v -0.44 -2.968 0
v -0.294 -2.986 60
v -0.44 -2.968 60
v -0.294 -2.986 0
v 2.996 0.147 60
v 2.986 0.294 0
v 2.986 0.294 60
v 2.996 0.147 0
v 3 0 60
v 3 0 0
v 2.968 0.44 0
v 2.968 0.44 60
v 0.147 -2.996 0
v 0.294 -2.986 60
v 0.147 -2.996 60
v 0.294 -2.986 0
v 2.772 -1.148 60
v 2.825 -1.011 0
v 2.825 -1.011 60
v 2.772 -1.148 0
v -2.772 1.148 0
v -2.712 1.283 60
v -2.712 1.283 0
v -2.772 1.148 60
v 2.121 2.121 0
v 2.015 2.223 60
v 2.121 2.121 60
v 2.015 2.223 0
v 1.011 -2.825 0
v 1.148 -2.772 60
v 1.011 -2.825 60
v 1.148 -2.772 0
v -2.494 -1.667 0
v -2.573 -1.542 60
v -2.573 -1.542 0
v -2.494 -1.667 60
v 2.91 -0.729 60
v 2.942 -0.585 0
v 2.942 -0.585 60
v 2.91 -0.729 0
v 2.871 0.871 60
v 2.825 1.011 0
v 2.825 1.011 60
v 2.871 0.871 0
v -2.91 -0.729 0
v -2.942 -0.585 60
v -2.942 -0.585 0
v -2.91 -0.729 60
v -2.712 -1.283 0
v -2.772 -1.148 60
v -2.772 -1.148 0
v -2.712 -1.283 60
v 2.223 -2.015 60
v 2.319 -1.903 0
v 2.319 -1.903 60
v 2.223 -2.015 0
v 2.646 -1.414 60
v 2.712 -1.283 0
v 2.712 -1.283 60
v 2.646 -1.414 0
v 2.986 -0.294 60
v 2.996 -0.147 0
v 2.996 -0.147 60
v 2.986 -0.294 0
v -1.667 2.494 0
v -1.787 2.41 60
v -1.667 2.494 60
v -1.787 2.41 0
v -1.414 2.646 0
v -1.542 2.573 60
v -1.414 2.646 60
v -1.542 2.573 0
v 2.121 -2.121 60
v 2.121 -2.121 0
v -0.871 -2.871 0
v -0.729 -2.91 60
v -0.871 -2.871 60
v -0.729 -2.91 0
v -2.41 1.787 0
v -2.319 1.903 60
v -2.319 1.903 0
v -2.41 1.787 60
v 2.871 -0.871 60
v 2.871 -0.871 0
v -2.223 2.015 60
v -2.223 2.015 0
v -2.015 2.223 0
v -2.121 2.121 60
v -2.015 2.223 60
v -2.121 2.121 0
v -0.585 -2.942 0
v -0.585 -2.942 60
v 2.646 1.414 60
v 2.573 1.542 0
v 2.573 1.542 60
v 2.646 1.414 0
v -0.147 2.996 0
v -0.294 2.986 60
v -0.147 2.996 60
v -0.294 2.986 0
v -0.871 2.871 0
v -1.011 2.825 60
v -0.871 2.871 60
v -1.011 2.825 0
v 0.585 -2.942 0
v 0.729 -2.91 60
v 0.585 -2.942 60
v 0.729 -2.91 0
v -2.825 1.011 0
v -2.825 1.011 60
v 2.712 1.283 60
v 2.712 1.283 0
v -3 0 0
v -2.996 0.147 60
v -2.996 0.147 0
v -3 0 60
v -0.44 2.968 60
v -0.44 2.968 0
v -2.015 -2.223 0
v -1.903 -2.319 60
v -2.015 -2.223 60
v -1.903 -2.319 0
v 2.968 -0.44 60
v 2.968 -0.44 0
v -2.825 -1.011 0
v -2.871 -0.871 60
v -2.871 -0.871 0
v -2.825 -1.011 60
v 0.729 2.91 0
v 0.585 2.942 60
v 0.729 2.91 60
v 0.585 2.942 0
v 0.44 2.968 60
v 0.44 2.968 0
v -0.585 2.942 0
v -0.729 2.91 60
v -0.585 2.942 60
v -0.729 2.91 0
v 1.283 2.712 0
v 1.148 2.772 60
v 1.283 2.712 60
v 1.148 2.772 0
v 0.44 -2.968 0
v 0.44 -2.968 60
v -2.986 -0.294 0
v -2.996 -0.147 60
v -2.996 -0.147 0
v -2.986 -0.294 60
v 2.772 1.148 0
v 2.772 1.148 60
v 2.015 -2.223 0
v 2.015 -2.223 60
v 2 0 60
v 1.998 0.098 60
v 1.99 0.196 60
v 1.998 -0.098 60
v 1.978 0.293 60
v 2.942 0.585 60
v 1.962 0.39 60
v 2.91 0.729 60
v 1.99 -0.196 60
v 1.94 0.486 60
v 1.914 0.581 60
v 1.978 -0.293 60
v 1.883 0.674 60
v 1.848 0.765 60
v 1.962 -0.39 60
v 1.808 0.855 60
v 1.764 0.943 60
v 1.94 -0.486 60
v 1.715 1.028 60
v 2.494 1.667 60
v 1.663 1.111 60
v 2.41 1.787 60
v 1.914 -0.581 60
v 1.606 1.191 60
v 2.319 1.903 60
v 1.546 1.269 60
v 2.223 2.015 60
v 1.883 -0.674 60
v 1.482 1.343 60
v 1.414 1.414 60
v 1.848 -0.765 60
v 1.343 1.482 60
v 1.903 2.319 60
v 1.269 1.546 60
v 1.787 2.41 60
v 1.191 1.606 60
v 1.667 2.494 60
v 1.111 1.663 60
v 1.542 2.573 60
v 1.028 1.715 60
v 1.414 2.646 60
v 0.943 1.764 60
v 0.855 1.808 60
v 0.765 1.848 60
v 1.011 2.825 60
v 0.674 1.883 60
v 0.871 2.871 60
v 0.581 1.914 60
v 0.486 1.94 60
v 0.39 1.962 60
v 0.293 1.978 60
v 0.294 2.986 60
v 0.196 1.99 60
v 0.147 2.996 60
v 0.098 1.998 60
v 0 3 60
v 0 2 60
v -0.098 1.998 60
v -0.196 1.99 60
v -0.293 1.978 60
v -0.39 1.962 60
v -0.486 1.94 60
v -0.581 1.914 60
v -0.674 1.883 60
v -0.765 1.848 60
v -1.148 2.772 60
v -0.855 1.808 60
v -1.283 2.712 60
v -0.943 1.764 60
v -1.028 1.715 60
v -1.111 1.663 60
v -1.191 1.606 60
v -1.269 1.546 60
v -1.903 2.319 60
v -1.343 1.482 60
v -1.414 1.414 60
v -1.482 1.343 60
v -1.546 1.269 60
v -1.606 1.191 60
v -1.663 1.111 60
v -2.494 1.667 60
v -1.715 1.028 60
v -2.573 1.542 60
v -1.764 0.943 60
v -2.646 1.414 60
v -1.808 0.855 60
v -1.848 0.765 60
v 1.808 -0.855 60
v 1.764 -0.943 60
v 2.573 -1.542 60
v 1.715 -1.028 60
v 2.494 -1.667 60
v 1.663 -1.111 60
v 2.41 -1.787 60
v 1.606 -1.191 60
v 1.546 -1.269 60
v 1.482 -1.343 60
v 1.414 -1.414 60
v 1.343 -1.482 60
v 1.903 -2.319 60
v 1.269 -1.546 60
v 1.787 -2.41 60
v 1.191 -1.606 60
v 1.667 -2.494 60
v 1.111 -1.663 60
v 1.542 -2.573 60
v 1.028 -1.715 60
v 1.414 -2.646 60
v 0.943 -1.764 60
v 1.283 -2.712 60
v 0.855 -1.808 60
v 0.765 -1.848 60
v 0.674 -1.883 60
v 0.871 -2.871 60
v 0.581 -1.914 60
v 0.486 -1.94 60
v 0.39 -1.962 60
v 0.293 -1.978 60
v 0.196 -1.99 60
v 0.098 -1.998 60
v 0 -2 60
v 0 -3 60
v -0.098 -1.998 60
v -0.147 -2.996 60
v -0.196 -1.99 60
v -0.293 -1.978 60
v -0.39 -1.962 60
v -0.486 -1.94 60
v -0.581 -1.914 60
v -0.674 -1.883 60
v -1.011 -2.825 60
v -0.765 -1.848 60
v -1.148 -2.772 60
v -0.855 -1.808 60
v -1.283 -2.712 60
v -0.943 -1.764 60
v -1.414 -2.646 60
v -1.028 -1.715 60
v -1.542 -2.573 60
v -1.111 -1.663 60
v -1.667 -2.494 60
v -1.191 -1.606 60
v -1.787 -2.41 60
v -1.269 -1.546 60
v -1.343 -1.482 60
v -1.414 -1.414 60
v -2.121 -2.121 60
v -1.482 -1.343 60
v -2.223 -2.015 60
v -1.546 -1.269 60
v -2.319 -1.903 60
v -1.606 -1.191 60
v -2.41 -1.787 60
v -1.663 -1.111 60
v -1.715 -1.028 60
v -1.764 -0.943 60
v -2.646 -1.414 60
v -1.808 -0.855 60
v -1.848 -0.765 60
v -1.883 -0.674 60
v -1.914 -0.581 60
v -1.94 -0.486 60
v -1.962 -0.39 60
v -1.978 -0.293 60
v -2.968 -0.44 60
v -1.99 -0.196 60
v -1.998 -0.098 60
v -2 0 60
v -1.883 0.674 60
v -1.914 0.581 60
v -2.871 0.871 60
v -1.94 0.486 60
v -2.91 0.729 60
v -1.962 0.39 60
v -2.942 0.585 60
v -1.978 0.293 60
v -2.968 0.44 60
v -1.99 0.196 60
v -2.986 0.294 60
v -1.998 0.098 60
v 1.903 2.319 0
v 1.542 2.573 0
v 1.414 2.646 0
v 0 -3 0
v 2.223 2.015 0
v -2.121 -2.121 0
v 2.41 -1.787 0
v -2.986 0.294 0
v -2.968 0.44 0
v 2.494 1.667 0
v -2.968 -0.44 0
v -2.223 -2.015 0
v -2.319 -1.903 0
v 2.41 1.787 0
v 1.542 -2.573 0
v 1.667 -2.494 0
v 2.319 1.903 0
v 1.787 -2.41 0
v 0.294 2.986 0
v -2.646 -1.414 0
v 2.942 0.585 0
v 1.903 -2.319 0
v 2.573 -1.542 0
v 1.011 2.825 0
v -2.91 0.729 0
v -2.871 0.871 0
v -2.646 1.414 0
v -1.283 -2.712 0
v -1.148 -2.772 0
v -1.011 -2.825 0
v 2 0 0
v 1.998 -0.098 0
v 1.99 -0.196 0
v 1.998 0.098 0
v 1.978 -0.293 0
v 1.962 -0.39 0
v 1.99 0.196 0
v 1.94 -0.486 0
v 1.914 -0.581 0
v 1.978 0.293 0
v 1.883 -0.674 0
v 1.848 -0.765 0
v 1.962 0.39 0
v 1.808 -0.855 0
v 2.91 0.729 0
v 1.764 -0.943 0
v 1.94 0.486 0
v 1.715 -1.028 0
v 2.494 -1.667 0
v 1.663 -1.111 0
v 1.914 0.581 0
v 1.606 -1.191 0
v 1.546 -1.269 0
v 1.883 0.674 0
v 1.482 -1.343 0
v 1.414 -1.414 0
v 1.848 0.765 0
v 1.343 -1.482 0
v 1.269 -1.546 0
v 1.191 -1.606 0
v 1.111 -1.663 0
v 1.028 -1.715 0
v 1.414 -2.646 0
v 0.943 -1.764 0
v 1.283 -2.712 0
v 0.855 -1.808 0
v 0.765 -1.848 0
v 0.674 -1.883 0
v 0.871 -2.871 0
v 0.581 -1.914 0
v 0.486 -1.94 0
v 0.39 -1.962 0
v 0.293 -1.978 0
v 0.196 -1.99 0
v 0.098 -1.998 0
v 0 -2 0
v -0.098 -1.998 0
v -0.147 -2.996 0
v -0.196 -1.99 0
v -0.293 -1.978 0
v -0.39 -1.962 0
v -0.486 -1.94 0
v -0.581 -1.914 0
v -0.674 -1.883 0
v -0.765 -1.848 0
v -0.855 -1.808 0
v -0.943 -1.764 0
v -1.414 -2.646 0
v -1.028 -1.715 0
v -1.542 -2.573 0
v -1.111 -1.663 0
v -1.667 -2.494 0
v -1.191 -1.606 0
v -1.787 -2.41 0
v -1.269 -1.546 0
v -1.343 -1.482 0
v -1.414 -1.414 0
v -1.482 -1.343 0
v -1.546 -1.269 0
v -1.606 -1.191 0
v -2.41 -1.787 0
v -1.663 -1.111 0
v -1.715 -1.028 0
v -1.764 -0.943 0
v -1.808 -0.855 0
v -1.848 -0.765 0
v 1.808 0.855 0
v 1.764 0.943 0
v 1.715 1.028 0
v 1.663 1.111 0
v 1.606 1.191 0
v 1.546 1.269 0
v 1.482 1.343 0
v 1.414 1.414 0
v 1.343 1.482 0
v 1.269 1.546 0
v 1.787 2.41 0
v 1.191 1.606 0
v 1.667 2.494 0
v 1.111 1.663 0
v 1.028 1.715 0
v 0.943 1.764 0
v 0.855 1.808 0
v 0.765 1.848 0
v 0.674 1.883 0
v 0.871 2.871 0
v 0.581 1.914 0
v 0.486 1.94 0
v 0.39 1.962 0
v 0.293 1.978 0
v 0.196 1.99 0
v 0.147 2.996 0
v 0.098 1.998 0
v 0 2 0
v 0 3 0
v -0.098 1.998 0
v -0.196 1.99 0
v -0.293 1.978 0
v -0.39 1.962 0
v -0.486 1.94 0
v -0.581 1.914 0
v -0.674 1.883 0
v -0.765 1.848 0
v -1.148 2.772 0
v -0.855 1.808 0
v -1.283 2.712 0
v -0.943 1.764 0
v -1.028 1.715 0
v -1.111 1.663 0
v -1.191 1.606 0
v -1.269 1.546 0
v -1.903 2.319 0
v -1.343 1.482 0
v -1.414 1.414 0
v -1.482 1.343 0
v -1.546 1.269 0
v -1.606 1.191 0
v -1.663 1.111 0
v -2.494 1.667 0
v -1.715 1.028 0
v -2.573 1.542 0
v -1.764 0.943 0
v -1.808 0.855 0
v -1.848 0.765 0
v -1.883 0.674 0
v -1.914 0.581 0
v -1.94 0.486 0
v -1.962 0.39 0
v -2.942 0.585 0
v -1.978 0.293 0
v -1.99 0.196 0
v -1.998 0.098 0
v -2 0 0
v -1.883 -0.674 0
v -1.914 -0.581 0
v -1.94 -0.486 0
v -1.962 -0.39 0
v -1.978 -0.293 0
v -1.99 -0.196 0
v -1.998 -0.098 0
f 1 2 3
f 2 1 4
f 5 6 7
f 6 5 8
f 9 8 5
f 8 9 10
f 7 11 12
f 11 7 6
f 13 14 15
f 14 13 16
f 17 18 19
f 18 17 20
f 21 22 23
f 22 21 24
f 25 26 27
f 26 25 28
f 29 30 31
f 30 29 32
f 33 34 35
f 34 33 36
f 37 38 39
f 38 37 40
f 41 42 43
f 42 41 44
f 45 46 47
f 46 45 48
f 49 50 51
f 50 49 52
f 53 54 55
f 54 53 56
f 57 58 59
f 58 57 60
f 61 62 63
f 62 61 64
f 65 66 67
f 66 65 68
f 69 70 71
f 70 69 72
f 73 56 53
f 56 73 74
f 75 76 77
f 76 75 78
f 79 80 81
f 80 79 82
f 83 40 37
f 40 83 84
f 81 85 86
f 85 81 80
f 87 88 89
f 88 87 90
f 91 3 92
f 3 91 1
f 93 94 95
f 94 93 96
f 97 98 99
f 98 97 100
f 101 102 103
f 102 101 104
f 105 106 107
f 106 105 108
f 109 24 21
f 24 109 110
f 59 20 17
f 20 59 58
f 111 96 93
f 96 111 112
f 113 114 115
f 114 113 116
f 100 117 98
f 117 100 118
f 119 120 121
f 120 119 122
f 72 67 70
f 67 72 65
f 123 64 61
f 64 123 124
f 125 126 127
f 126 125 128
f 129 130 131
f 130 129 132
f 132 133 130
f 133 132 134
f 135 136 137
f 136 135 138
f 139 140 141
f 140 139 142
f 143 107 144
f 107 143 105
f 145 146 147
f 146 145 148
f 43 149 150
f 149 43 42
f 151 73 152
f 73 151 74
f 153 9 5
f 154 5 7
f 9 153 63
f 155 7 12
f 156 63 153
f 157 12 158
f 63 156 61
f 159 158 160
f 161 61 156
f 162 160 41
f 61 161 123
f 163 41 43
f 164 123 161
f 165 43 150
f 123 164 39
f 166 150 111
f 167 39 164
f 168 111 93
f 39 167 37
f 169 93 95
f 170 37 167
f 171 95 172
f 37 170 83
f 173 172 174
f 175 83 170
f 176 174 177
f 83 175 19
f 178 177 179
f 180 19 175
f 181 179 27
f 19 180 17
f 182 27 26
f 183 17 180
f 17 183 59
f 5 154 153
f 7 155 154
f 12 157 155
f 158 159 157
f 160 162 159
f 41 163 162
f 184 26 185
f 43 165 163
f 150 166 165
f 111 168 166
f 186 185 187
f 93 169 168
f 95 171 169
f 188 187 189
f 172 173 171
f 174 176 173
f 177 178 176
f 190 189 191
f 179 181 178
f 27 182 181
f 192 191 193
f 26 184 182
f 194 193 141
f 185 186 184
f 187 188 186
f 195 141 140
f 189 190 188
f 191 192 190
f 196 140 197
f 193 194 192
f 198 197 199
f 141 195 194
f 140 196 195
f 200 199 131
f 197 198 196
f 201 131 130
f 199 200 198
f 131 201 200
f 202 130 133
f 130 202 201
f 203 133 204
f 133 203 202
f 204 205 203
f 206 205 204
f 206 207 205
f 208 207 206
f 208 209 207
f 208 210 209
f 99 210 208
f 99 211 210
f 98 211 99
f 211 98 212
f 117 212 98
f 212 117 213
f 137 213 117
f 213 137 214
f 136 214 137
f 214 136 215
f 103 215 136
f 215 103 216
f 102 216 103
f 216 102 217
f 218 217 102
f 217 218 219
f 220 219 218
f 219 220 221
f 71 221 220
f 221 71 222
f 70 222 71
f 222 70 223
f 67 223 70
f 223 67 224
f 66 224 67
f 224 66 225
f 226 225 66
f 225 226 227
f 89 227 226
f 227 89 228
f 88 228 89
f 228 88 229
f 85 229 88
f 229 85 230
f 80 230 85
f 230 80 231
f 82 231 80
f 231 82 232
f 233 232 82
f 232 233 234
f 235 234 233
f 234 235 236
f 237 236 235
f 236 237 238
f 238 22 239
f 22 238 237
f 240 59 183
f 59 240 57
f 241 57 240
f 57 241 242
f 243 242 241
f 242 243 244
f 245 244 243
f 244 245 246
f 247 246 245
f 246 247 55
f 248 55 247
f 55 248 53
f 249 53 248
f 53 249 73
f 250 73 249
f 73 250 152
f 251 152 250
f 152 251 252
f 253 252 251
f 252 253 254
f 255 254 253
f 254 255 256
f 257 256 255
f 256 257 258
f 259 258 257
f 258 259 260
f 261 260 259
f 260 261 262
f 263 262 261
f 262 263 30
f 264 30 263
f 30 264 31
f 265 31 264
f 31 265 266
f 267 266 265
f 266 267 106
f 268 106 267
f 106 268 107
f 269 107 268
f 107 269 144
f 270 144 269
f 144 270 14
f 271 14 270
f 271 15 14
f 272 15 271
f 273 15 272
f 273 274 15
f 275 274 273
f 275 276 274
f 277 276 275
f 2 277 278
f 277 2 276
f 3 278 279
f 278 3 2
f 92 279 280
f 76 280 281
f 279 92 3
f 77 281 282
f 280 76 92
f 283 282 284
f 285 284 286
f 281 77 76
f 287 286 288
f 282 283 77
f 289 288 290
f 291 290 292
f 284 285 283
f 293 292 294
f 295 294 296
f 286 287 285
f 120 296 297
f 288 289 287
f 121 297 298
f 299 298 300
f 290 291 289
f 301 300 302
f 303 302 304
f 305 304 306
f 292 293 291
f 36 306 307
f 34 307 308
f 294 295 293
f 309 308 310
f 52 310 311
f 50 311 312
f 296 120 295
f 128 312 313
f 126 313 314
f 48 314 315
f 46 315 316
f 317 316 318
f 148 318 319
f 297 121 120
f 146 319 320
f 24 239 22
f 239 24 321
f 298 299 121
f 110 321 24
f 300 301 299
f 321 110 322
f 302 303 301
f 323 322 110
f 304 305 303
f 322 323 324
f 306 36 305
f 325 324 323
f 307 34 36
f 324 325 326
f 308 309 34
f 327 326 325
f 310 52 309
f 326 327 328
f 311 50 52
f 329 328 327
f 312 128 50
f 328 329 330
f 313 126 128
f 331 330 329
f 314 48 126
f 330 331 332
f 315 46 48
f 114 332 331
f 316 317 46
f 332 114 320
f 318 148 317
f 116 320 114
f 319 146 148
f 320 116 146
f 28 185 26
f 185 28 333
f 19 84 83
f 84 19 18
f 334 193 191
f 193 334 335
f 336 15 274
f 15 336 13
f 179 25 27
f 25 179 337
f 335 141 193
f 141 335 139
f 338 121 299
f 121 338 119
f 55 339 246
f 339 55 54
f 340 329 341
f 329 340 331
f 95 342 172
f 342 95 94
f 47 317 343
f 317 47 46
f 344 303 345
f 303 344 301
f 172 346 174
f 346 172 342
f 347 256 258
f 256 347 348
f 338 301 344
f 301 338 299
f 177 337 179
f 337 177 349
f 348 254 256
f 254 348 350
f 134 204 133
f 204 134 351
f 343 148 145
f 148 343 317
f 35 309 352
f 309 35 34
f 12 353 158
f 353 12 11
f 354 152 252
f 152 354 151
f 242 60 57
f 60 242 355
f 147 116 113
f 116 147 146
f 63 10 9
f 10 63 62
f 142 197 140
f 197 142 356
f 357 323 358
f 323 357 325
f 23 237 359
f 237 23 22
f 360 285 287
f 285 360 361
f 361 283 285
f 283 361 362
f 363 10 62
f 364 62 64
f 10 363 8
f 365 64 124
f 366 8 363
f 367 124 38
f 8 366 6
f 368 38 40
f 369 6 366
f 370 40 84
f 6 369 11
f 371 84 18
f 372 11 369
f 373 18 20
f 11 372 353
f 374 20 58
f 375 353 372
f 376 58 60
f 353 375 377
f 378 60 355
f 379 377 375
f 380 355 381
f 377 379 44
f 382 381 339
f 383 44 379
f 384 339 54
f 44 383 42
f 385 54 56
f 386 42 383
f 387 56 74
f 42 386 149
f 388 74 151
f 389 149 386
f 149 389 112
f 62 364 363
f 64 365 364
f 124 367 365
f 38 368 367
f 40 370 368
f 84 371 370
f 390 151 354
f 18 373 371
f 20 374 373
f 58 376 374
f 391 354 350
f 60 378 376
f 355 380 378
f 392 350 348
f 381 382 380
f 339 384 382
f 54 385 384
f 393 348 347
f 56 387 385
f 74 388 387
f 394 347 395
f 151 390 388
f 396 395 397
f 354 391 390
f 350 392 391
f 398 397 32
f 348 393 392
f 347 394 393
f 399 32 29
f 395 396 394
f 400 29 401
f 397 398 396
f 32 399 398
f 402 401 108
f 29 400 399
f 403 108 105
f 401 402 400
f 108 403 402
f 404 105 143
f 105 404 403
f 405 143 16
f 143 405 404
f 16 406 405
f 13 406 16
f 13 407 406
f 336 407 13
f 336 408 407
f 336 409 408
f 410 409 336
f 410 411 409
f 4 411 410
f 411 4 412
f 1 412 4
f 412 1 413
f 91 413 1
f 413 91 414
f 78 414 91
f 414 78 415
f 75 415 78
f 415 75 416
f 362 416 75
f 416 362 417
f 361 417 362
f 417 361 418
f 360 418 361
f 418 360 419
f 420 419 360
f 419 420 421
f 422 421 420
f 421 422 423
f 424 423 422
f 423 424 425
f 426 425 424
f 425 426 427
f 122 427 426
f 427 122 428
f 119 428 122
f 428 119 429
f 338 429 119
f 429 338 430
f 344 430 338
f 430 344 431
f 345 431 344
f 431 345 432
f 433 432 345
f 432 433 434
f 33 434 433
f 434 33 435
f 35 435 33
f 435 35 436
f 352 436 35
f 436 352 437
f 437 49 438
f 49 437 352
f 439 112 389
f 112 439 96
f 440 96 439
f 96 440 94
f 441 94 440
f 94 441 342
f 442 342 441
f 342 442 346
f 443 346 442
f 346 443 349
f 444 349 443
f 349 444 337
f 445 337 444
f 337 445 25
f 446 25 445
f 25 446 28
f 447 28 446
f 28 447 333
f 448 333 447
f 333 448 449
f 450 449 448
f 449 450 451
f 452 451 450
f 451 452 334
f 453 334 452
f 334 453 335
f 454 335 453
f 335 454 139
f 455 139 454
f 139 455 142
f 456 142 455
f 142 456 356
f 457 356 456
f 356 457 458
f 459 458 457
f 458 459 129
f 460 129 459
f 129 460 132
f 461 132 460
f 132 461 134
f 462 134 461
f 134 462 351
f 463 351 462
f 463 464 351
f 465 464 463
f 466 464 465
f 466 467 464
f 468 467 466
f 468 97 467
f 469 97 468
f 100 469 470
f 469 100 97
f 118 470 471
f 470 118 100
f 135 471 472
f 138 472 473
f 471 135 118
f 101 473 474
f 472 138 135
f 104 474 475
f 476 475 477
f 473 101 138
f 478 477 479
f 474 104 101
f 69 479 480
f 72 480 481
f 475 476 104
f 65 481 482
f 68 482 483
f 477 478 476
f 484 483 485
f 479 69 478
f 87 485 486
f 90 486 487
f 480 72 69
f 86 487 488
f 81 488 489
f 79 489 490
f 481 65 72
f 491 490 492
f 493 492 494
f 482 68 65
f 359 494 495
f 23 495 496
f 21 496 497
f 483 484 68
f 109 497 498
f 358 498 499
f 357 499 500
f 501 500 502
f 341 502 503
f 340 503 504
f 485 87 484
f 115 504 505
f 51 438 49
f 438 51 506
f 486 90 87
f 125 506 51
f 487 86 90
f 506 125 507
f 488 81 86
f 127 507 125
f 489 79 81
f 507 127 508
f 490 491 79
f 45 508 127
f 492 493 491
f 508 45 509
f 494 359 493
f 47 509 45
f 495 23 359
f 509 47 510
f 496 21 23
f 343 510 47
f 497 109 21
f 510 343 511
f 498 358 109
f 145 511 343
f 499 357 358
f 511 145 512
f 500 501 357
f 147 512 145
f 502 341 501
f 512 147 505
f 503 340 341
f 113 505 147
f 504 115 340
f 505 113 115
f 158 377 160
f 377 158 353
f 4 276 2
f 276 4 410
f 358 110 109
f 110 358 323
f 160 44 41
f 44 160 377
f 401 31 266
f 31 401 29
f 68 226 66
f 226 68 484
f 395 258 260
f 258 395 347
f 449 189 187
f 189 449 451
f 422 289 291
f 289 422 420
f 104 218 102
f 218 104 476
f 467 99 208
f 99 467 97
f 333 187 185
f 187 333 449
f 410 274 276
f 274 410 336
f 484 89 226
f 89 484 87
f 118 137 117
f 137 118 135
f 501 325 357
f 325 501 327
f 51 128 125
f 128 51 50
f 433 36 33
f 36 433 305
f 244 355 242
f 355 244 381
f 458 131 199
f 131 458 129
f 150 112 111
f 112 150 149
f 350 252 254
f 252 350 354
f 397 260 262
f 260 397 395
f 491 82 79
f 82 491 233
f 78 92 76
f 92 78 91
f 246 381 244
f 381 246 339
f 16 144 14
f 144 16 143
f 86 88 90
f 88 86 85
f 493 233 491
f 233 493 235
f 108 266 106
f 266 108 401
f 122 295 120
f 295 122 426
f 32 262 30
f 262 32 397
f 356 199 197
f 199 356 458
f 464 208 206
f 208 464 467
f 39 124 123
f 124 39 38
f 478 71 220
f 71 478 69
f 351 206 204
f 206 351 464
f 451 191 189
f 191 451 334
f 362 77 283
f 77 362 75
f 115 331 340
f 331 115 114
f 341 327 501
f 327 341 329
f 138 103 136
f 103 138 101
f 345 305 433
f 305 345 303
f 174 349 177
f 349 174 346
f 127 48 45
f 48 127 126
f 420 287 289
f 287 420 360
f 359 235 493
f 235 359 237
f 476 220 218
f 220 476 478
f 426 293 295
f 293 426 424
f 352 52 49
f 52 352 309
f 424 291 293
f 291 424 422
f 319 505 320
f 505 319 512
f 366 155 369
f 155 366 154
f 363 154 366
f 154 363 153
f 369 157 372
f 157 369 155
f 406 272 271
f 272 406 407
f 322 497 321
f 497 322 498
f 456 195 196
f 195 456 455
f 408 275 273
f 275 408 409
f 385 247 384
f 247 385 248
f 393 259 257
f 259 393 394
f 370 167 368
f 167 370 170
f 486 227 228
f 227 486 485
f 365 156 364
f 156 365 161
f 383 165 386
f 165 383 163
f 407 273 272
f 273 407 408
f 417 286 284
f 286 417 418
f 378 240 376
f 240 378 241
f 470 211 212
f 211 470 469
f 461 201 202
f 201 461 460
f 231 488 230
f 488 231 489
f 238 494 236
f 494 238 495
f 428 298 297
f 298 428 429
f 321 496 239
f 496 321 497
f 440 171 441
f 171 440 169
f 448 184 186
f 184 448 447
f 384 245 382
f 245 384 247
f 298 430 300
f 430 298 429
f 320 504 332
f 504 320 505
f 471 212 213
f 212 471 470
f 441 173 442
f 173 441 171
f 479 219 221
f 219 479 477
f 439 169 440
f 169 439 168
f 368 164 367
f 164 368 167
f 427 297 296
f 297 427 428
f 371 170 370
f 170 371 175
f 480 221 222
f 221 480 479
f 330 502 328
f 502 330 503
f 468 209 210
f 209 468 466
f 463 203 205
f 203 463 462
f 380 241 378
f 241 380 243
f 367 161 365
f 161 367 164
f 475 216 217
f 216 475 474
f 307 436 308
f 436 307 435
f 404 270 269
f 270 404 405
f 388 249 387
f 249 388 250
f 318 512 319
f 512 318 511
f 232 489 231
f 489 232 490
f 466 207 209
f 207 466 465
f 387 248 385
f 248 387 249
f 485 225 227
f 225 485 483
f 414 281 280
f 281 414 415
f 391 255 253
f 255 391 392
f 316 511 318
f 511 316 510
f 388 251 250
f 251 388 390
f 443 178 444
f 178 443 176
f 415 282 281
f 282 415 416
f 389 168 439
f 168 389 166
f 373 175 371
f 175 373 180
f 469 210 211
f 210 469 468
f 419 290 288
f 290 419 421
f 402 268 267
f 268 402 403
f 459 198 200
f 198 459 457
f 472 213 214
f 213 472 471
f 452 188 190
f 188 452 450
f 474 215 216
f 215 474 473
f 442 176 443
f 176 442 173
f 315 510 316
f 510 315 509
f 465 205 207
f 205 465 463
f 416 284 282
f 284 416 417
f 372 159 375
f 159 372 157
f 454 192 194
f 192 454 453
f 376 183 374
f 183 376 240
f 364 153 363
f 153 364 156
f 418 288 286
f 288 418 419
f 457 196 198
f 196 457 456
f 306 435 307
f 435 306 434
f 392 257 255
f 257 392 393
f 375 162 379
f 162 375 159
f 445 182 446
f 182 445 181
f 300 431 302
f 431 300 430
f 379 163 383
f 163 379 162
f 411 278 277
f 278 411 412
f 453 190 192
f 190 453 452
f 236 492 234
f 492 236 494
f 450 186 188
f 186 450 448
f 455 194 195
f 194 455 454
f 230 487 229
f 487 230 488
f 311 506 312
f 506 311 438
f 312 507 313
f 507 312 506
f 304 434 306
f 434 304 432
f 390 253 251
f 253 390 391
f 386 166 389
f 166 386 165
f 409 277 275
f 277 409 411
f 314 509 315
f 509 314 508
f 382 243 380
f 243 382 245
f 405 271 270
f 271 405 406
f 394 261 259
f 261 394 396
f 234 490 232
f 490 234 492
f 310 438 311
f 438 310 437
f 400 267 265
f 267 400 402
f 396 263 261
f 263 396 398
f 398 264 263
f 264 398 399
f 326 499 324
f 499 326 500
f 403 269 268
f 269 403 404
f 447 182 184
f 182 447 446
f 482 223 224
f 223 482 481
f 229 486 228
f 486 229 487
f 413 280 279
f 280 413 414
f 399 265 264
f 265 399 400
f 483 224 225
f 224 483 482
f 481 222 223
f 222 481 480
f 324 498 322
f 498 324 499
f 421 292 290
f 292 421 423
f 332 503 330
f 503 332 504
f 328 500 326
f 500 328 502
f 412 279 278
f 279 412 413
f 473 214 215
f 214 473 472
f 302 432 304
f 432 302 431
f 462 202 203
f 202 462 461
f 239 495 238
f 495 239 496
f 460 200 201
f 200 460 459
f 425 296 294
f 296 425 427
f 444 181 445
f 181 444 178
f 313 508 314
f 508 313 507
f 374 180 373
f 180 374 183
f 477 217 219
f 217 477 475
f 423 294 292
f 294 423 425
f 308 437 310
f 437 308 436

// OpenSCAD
$fn = 128;

// PTFE sleeving (tubing) parameters (mm)
length = 60;
outer_d = 6;
inner_d = 4;

// Simple hollow cylinder (tube)
difference() {
  cylinder(h = length, d = outer_d, center = false);
  translate([0, 0, -0.5])
    cylinder(h = length + 1, d = inner_d, center = false);
}
